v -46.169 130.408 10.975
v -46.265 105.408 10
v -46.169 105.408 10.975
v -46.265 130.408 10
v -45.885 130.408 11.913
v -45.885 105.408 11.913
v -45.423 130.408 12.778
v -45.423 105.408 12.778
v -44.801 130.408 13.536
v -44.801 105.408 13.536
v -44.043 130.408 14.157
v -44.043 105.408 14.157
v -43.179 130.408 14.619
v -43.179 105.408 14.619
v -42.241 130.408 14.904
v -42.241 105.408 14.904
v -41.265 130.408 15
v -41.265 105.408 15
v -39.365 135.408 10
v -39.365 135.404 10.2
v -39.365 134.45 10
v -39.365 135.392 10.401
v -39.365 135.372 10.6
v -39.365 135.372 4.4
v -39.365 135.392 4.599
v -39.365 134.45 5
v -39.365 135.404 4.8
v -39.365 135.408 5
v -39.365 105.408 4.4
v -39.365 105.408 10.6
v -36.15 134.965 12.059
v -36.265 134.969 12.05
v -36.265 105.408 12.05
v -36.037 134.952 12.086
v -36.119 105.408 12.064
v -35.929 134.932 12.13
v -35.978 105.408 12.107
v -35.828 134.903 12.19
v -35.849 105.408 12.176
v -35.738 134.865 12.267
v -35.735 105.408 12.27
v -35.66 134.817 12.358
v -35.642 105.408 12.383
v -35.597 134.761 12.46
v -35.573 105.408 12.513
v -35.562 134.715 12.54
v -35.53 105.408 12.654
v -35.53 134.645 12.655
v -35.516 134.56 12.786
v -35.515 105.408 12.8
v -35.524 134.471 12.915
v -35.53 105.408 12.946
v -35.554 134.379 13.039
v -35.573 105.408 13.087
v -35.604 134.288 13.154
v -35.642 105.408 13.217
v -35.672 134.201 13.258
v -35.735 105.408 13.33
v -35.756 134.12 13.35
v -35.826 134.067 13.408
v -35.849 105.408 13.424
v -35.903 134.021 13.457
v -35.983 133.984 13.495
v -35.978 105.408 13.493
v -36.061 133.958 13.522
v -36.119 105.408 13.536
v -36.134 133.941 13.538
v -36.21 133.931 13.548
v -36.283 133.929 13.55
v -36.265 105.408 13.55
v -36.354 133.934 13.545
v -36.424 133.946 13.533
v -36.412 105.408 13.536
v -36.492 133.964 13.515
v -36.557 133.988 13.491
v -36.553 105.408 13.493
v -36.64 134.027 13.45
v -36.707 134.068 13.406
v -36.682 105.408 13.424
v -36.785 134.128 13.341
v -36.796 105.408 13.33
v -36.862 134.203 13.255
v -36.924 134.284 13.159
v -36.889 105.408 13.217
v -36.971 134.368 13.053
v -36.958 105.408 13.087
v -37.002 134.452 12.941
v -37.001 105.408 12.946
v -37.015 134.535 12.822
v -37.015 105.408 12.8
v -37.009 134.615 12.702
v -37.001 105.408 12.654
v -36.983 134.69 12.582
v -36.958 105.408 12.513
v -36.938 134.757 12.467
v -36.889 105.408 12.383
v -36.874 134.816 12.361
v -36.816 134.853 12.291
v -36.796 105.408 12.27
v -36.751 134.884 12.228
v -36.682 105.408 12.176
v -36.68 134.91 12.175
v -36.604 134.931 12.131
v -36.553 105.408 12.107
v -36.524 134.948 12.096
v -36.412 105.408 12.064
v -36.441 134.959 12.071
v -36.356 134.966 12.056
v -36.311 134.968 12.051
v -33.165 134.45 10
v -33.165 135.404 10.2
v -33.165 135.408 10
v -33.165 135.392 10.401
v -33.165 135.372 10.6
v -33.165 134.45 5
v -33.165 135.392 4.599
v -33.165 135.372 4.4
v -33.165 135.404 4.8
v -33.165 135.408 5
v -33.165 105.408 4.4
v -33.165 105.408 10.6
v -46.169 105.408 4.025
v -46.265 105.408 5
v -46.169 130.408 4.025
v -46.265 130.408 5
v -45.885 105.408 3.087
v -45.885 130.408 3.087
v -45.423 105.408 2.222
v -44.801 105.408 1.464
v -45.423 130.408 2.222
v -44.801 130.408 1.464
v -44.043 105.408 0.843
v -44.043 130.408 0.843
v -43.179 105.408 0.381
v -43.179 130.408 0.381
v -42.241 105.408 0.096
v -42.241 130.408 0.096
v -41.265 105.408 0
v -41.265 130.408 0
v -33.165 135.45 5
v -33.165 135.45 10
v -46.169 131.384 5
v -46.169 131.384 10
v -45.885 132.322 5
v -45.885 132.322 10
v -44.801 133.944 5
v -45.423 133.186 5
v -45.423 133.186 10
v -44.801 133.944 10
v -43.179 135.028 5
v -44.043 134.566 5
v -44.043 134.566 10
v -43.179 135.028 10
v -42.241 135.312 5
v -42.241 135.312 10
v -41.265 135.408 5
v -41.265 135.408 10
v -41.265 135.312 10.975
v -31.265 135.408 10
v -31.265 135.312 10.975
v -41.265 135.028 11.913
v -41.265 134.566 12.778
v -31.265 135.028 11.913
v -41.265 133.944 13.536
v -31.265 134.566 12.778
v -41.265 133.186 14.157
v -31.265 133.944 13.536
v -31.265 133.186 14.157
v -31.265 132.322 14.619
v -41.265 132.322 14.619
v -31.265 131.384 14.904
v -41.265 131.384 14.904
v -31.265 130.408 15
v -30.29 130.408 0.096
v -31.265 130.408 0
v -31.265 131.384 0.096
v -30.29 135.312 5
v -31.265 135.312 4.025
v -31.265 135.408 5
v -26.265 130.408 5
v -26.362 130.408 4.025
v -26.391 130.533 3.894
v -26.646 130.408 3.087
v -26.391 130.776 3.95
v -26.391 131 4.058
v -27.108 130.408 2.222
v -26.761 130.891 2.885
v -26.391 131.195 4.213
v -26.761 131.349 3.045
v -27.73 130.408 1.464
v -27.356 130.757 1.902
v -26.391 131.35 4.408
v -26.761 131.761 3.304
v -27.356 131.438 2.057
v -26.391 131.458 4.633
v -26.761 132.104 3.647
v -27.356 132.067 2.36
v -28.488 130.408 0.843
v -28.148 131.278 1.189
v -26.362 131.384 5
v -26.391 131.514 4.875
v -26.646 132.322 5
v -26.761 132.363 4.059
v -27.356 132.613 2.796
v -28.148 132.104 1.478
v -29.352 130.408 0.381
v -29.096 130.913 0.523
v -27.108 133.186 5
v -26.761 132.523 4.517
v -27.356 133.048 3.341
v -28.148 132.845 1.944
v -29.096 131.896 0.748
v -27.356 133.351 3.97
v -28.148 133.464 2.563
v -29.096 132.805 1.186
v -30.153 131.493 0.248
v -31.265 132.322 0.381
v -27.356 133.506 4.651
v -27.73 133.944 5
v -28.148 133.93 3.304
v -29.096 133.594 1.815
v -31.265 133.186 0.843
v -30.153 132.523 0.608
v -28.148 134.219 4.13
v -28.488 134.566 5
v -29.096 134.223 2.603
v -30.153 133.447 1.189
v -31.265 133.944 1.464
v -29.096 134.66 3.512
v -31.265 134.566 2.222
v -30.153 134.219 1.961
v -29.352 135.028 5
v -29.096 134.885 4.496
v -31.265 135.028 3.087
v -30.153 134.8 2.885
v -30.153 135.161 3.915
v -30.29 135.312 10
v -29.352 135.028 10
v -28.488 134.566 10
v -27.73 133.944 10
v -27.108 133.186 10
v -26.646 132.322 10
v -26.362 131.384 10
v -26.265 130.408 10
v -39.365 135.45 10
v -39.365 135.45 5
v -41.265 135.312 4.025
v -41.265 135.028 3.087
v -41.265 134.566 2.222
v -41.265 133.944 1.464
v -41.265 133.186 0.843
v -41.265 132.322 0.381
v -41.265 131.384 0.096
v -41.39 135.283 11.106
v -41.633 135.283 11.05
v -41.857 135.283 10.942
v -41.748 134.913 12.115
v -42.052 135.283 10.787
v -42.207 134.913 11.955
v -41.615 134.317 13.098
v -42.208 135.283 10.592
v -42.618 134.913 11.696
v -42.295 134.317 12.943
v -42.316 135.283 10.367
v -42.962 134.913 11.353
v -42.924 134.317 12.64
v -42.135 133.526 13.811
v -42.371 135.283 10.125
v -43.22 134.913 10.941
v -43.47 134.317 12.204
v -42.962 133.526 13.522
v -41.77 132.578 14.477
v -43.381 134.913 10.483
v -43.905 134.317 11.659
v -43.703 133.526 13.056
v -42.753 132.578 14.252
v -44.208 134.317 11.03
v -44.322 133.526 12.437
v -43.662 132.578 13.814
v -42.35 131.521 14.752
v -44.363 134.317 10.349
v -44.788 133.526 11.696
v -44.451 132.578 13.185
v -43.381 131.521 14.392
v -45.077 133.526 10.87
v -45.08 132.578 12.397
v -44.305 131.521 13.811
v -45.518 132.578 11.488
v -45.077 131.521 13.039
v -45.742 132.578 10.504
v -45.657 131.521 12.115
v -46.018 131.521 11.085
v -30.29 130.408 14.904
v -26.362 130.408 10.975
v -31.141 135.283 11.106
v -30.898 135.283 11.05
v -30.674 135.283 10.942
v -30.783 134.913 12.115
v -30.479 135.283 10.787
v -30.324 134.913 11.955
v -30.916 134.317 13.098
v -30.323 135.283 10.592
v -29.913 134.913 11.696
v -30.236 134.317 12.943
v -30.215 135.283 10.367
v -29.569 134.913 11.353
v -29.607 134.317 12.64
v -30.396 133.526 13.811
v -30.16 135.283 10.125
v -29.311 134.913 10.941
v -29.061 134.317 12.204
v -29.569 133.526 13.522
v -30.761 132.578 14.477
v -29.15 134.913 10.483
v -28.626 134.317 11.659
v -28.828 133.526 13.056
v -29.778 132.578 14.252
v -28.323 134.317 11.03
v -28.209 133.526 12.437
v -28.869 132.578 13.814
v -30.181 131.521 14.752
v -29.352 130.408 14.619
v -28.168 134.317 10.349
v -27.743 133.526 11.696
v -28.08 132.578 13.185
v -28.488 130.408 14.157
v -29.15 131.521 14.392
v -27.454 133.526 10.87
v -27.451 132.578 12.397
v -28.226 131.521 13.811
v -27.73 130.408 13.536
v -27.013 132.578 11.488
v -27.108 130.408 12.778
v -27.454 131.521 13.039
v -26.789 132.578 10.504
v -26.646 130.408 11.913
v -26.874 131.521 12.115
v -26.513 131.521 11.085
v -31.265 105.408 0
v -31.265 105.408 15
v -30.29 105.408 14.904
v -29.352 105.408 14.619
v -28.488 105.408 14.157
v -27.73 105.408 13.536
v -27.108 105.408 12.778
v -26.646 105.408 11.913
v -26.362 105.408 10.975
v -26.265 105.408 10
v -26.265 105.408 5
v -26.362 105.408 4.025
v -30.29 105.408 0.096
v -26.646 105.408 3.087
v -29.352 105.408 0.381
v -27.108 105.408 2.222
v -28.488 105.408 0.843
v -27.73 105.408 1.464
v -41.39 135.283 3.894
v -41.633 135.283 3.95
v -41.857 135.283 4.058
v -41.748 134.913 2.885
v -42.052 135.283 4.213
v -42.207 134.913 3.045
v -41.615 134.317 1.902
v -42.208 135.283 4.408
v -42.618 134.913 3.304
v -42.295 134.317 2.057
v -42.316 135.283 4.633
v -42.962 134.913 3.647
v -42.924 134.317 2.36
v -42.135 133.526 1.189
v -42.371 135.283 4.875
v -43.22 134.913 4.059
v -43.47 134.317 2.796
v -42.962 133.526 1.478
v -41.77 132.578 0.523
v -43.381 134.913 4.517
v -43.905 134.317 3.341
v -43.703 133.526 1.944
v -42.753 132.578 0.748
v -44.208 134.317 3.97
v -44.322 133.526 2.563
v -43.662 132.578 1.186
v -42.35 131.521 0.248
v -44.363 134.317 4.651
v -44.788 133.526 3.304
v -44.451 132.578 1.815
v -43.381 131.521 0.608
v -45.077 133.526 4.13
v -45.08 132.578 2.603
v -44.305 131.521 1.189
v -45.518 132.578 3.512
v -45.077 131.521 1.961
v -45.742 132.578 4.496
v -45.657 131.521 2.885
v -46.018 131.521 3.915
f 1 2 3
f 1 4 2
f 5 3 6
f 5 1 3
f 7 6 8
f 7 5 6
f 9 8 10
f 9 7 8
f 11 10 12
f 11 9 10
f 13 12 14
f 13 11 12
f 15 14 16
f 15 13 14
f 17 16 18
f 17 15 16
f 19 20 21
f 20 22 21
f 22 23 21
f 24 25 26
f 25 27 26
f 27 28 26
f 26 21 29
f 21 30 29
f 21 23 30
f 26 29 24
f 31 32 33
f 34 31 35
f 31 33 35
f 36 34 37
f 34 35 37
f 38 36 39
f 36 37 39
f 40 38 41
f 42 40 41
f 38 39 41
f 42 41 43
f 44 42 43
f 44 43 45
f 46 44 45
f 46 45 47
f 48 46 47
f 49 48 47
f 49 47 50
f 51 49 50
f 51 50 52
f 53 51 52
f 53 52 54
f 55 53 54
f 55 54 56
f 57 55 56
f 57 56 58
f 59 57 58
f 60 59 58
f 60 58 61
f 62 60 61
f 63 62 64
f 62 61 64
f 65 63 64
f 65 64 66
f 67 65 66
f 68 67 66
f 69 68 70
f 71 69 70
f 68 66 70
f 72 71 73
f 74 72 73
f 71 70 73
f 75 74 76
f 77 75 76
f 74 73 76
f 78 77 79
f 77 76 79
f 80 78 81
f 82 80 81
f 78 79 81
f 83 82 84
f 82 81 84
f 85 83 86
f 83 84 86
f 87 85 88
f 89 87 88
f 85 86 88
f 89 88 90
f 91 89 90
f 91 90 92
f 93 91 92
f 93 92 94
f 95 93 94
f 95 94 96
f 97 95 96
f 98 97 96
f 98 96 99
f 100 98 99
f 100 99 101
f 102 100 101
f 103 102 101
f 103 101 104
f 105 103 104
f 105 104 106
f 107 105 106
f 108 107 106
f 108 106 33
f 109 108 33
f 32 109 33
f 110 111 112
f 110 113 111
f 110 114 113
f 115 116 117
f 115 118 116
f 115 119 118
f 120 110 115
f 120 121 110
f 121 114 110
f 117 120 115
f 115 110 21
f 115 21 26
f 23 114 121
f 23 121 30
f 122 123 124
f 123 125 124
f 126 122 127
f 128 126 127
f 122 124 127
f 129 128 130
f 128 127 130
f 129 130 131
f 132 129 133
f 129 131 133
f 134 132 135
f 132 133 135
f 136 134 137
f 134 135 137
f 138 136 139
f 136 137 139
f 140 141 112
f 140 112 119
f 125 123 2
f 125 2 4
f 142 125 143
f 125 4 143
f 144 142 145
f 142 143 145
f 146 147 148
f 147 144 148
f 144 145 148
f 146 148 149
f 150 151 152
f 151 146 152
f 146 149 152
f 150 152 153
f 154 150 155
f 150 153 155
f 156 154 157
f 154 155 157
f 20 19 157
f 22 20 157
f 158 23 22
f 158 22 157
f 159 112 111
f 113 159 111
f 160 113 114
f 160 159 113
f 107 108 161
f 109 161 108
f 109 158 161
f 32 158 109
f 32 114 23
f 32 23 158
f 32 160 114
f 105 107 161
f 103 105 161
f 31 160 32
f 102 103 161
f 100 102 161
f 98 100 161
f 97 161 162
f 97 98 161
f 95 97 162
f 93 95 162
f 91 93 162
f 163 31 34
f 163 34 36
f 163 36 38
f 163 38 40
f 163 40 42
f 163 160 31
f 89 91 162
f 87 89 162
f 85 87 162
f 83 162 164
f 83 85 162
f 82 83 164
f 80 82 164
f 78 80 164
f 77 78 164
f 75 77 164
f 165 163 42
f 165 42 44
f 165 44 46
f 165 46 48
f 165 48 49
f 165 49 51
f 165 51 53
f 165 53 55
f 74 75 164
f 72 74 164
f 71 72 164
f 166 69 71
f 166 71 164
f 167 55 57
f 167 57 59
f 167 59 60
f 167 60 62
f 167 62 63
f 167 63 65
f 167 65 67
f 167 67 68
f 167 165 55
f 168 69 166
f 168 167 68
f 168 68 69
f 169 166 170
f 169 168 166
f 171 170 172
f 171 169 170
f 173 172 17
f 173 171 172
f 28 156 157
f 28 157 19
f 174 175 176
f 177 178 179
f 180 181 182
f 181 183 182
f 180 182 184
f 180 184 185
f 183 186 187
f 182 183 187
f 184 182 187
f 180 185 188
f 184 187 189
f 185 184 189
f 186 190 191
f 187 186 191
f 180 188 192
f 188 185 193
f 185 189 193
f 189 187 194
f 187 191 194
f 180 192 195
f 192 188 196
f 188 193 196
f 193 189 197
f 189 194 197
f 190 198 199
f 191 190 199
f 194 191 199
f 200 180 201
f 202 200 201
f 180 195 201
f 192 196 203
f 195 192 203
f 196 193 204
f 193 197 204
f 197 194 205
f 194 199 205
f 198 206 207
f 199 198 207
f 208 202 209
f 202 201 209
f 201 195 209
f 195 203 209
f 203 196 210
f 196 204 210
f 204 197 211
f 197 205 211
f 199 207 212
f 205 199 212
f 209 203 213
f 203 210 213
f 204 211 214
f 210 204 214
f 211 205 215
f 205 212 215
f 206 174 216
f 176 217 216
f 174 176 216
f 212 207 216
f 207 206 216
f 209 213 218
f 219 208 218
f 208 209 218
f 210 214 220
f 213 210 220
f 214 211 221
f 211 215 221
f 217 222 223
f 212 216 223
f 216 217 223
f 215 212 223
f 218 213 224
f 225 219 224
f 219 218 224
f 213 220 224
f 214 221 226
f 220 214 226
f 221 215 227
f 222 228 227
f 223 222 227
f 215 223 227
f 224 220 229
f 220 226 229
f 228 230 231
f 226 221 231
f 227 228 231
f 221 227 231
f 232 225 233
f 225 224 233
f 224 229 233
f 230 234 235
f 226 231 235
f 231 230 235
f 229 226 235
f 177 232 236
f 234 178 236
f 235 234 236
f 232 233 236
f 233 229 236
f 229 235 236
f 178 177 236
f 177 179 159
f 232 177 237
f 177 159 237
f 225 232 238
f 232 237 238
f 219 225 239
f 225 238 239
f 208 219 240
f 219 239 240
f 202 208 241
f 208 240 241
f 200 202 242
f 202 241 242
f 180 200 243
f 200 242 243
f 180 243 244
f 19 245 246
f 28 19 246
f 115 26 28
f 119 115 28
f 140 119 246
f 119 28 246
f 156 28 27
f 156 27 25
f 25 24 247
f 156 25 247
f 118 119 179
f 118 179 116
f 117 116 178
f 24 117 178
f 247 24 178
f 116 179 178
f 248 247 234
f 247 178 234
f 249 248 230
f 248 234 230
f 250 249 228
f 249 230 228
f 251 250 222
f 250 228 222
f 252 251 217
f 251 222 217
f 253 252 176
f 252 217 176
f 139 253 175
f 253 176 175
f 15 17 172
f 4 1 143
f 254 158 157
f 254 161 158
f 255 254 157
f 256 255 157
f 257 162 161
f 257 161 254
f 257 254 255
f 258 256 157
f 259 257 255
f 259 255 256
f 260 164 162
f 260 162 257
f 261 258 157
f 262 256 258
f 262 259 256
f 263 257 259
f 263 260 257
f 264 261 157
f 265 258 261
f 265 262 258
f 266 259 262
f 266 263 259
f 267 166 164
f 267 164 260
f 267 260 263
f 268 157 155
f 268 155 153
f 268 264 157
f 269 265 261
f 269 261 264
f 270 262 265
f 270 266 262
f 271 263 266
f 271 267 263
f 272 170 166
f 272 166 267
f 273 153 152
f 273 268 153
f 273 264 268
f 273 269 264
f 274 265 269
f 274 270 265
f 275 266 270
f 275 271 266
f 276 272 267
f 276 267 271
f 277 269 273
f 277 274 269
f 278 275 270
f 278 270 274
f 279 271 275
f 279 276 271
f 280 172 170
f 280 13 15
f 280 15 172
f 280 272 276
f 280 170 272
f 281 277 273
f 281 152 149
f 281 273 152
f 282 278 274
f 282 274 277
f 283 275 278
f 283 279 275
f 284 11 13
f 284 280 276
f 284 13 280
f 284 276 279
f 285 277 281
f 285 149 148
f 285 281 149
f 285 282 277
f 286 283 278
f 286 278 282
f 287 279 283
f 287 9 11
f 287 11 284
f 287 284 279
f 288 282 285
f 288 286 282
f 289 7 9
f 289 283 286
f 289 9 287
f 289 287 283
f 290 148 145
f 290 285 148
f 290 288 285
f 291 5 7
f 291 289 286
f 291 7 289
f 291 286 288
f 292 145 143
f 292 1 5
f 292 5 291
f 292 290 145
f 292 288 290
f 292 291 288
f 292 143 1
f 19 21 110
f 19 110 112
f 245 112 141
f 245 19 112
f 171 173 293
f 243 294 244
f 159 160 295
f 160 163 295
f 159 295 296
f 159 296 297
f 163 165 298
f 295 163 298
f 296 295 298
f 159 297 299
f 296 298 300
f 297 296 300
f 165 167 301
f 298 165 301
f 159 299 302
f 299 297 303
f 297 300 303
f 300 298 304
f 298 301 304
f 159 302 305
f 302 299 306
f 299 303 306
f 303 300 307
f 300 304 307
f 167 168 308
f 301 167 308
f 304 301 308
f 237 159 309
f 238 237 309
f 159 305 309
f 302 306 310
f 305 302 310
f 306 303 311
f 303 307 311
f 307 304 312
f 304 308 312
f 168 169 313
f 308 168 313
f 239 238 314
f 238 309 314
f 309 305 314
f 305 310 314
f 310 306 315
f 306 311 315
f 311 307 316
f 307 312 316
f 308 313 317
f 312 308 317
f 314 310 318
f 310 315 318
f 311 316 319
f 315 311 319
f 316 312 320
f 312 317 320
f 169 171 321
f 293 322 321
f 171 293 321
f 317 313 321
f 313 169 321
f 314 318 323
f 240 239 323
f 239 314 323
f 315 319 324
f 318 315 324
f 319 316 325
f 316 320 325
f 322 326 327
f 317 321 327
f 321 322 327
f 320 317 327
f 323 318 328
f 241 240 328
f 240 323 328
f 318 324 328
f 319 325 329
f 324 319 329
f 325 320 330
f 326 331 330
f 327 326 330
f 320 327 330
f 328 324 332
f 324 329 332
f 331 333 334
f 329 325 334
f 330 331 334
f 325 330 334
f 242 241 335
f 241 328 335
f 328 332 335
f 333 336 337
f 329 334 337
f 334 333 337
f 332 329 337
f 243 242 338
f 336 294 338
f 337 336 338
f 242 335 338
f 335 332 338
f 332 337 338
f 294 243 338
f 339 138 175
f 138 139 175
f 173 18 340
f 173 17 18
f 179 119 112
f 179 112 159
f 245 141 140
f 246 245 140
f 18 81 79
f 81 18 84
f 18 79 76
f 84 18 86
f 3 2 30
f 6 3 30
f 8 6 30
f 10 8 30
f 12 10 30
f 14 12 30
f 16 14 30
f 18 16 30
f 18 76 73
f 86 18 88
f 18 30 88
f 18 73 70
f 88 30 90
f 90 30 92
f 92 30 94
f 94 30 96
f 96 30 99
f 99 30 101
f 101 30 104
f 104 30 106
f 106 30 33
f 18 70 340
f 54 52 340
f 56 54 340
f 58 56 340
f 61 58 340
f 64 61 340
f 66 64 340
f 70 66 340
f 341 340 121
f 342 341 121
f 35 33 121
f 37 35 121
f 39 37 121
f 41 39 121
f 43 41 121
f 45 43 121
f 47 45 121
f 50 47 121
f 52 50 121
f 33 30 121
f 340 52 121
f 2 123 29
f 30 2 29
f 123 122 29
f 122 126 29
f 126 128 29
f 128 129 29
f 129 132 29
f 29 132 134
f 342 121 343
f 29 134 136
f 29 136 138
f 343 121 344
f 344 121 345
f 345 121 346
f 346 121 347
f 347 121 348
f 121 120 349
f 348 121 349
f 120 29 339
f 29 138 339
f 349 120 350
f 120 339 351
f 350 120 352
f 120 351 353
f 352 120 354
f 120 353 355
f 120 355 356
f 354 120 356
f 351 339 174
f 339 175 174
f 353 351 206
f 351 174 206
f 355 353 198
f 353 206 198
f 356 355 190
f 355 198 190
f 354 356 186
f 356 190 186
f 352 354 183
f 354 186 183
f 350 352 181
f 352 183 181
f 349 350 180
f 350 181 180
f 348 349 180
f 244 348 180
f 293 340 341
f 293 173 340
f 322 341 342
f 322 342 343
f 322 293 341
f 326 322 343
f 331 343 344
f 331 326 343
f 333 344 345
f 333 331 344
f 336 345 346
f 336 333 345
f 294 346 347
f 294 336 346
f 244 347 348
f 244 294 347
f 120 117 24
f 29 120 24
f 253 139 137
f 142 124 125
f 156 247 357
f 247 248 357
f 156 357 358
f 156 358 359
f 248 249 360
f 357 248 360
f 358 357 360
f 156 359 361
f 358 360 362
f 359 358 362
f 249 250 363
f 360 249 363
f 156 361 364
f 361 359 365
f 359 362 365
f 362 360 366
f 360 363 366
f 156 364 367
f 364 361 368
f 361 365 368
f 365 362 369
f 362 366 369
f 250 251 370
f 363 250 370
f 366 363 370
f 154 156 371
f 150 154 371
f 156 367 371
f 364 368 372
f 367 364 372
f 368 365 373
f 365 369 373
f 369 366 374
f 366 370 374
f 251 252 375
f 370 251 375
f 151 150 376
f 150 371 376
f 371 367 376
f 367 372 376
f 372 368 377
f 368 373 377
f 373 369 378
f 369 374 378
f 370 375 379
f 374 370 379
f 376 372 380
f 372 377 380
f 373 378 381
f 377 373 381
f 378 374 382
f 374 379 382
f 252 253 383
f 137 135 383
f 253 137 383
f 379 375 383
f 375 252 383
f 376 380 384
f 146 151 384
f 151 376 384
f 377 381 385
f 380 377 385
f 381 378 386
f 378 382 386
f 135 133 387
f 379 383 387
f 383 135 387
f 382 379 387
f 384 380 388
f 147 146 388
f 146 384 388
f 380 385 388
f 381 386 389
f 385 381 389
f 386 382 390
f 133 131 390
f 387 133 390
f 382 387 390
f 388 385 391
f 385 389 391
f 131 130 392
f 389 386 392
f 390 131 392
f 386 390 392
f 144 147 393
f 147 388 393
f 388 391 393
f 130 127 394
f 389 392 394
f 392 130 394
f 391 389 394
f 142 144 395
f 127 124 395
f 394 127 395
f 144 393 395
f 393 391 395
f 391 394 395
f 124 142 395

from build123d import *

# Parameters (mm, degrees)
SKETCH1_W           = 20
SKETCH1_H           = 30
BOSS_EXTRUDE1_DEPTH = 15
SKETCH2_W           = 6.2
SKETCH2_H           = 6.2
CUT_EXTRUDE1_DEPTH  = 3.25
FILLET1_R           = 5
SKETCH4_W           = 6.2
SKETCH4_H           = 6.2
CUT_EXTRUDE2_DEPTH  = 68
SKETCH6_W           = 5
SKETCH6_H           = 1
BOSS_EXTRUDE3_DEPTH = 6.2
SKETCH7_R           = 0.75
CUT_EXTRUDE3_DEPTH  = 37


with BuildPart() as part:
    # Sketch1 → Boss-Extrude1 (new body)
    with BuildSketch(Plane.XY):
        with Locations((-36.265495527, 120.408164147)):
            Rectangle(SKETCH1_W, SKETCH1_H)
    extrude(amount=BOSS_EXTRUDE1_DEPTH)

    # Sketch2 → Cut-Extrude1 (cut)
    with BuildSketch(Plane(origin=(0, 105.408164147, 0), x_dir=(-1, 0, 0), z_dir=(0, -1, 0))):
        with Locations((36.265495527, -7.5)):
            Rectangle(SKETCH2_W, SKETCH2_H)
    extrude(amount=-CUT_EXTRUDE1_DEPTH, mode=Mode.SUBTRACT)

    # Fillet1
    fillet1_edges = [part.edges().sort_by_distance(p)[0] for p in [
        (-46.265495527, 120.408164147, 15),
        (-26.265495527, 120.408164147, 15),
        (-46.265495527, 120.408164147, 0),
        (-36.265495527, 135.408164147, 0),
        (-26.265495527, 120.408164147, 0),
        (-36.265495527, 135.408164147, 15),
        (-46.265495527, 135.408164147, 7.5),
        (-26.265495527, 135.408164147, 7.5),
    ]]
    fillet(fillet1_edges, radius=FILLET1_R)

    # Sketch4 → Cut-Extrude2 (cut)
    with BuildSketch(Plane.XZ.offset(-108.658164147)):
        with Locations((-36.265495527, 7.5)):
            Rectangle(SKETCH4_W, SKETCH4_H)
    extrude(amount=-CUT_EXTRUDE2_DEPTH, mode=Mode.SUBTRACT)

    # Sketch6 → Boss-Extrude3 (add)
    with BuildSketch(Plane(origin=(-39.365495527, 0, 0), x_dir=(0, 0, -1), z_dir=(1, 0, 0))):
        with Locations((-7.5, 134.949726458)):
            Rectangle(SKETCH6_W, SKETCH6_H)
    extrude(amount=BOSS_EXTRUDE3_DEPTH)

    # Sketch7 → Cut-Extrude3 (cut)
    with BuildSketch(Plane.XZ.offset(-105.408164147)):
        with Locations(Location((-36.265495527, 12.8, 0), (0, 0, 270))):
            Circle(SKETCH7_R)
    extrude(amount=-CUT_EXTRUDE3_DEPTH, mode=Mode.SUBTRACT)


solid = part.part
